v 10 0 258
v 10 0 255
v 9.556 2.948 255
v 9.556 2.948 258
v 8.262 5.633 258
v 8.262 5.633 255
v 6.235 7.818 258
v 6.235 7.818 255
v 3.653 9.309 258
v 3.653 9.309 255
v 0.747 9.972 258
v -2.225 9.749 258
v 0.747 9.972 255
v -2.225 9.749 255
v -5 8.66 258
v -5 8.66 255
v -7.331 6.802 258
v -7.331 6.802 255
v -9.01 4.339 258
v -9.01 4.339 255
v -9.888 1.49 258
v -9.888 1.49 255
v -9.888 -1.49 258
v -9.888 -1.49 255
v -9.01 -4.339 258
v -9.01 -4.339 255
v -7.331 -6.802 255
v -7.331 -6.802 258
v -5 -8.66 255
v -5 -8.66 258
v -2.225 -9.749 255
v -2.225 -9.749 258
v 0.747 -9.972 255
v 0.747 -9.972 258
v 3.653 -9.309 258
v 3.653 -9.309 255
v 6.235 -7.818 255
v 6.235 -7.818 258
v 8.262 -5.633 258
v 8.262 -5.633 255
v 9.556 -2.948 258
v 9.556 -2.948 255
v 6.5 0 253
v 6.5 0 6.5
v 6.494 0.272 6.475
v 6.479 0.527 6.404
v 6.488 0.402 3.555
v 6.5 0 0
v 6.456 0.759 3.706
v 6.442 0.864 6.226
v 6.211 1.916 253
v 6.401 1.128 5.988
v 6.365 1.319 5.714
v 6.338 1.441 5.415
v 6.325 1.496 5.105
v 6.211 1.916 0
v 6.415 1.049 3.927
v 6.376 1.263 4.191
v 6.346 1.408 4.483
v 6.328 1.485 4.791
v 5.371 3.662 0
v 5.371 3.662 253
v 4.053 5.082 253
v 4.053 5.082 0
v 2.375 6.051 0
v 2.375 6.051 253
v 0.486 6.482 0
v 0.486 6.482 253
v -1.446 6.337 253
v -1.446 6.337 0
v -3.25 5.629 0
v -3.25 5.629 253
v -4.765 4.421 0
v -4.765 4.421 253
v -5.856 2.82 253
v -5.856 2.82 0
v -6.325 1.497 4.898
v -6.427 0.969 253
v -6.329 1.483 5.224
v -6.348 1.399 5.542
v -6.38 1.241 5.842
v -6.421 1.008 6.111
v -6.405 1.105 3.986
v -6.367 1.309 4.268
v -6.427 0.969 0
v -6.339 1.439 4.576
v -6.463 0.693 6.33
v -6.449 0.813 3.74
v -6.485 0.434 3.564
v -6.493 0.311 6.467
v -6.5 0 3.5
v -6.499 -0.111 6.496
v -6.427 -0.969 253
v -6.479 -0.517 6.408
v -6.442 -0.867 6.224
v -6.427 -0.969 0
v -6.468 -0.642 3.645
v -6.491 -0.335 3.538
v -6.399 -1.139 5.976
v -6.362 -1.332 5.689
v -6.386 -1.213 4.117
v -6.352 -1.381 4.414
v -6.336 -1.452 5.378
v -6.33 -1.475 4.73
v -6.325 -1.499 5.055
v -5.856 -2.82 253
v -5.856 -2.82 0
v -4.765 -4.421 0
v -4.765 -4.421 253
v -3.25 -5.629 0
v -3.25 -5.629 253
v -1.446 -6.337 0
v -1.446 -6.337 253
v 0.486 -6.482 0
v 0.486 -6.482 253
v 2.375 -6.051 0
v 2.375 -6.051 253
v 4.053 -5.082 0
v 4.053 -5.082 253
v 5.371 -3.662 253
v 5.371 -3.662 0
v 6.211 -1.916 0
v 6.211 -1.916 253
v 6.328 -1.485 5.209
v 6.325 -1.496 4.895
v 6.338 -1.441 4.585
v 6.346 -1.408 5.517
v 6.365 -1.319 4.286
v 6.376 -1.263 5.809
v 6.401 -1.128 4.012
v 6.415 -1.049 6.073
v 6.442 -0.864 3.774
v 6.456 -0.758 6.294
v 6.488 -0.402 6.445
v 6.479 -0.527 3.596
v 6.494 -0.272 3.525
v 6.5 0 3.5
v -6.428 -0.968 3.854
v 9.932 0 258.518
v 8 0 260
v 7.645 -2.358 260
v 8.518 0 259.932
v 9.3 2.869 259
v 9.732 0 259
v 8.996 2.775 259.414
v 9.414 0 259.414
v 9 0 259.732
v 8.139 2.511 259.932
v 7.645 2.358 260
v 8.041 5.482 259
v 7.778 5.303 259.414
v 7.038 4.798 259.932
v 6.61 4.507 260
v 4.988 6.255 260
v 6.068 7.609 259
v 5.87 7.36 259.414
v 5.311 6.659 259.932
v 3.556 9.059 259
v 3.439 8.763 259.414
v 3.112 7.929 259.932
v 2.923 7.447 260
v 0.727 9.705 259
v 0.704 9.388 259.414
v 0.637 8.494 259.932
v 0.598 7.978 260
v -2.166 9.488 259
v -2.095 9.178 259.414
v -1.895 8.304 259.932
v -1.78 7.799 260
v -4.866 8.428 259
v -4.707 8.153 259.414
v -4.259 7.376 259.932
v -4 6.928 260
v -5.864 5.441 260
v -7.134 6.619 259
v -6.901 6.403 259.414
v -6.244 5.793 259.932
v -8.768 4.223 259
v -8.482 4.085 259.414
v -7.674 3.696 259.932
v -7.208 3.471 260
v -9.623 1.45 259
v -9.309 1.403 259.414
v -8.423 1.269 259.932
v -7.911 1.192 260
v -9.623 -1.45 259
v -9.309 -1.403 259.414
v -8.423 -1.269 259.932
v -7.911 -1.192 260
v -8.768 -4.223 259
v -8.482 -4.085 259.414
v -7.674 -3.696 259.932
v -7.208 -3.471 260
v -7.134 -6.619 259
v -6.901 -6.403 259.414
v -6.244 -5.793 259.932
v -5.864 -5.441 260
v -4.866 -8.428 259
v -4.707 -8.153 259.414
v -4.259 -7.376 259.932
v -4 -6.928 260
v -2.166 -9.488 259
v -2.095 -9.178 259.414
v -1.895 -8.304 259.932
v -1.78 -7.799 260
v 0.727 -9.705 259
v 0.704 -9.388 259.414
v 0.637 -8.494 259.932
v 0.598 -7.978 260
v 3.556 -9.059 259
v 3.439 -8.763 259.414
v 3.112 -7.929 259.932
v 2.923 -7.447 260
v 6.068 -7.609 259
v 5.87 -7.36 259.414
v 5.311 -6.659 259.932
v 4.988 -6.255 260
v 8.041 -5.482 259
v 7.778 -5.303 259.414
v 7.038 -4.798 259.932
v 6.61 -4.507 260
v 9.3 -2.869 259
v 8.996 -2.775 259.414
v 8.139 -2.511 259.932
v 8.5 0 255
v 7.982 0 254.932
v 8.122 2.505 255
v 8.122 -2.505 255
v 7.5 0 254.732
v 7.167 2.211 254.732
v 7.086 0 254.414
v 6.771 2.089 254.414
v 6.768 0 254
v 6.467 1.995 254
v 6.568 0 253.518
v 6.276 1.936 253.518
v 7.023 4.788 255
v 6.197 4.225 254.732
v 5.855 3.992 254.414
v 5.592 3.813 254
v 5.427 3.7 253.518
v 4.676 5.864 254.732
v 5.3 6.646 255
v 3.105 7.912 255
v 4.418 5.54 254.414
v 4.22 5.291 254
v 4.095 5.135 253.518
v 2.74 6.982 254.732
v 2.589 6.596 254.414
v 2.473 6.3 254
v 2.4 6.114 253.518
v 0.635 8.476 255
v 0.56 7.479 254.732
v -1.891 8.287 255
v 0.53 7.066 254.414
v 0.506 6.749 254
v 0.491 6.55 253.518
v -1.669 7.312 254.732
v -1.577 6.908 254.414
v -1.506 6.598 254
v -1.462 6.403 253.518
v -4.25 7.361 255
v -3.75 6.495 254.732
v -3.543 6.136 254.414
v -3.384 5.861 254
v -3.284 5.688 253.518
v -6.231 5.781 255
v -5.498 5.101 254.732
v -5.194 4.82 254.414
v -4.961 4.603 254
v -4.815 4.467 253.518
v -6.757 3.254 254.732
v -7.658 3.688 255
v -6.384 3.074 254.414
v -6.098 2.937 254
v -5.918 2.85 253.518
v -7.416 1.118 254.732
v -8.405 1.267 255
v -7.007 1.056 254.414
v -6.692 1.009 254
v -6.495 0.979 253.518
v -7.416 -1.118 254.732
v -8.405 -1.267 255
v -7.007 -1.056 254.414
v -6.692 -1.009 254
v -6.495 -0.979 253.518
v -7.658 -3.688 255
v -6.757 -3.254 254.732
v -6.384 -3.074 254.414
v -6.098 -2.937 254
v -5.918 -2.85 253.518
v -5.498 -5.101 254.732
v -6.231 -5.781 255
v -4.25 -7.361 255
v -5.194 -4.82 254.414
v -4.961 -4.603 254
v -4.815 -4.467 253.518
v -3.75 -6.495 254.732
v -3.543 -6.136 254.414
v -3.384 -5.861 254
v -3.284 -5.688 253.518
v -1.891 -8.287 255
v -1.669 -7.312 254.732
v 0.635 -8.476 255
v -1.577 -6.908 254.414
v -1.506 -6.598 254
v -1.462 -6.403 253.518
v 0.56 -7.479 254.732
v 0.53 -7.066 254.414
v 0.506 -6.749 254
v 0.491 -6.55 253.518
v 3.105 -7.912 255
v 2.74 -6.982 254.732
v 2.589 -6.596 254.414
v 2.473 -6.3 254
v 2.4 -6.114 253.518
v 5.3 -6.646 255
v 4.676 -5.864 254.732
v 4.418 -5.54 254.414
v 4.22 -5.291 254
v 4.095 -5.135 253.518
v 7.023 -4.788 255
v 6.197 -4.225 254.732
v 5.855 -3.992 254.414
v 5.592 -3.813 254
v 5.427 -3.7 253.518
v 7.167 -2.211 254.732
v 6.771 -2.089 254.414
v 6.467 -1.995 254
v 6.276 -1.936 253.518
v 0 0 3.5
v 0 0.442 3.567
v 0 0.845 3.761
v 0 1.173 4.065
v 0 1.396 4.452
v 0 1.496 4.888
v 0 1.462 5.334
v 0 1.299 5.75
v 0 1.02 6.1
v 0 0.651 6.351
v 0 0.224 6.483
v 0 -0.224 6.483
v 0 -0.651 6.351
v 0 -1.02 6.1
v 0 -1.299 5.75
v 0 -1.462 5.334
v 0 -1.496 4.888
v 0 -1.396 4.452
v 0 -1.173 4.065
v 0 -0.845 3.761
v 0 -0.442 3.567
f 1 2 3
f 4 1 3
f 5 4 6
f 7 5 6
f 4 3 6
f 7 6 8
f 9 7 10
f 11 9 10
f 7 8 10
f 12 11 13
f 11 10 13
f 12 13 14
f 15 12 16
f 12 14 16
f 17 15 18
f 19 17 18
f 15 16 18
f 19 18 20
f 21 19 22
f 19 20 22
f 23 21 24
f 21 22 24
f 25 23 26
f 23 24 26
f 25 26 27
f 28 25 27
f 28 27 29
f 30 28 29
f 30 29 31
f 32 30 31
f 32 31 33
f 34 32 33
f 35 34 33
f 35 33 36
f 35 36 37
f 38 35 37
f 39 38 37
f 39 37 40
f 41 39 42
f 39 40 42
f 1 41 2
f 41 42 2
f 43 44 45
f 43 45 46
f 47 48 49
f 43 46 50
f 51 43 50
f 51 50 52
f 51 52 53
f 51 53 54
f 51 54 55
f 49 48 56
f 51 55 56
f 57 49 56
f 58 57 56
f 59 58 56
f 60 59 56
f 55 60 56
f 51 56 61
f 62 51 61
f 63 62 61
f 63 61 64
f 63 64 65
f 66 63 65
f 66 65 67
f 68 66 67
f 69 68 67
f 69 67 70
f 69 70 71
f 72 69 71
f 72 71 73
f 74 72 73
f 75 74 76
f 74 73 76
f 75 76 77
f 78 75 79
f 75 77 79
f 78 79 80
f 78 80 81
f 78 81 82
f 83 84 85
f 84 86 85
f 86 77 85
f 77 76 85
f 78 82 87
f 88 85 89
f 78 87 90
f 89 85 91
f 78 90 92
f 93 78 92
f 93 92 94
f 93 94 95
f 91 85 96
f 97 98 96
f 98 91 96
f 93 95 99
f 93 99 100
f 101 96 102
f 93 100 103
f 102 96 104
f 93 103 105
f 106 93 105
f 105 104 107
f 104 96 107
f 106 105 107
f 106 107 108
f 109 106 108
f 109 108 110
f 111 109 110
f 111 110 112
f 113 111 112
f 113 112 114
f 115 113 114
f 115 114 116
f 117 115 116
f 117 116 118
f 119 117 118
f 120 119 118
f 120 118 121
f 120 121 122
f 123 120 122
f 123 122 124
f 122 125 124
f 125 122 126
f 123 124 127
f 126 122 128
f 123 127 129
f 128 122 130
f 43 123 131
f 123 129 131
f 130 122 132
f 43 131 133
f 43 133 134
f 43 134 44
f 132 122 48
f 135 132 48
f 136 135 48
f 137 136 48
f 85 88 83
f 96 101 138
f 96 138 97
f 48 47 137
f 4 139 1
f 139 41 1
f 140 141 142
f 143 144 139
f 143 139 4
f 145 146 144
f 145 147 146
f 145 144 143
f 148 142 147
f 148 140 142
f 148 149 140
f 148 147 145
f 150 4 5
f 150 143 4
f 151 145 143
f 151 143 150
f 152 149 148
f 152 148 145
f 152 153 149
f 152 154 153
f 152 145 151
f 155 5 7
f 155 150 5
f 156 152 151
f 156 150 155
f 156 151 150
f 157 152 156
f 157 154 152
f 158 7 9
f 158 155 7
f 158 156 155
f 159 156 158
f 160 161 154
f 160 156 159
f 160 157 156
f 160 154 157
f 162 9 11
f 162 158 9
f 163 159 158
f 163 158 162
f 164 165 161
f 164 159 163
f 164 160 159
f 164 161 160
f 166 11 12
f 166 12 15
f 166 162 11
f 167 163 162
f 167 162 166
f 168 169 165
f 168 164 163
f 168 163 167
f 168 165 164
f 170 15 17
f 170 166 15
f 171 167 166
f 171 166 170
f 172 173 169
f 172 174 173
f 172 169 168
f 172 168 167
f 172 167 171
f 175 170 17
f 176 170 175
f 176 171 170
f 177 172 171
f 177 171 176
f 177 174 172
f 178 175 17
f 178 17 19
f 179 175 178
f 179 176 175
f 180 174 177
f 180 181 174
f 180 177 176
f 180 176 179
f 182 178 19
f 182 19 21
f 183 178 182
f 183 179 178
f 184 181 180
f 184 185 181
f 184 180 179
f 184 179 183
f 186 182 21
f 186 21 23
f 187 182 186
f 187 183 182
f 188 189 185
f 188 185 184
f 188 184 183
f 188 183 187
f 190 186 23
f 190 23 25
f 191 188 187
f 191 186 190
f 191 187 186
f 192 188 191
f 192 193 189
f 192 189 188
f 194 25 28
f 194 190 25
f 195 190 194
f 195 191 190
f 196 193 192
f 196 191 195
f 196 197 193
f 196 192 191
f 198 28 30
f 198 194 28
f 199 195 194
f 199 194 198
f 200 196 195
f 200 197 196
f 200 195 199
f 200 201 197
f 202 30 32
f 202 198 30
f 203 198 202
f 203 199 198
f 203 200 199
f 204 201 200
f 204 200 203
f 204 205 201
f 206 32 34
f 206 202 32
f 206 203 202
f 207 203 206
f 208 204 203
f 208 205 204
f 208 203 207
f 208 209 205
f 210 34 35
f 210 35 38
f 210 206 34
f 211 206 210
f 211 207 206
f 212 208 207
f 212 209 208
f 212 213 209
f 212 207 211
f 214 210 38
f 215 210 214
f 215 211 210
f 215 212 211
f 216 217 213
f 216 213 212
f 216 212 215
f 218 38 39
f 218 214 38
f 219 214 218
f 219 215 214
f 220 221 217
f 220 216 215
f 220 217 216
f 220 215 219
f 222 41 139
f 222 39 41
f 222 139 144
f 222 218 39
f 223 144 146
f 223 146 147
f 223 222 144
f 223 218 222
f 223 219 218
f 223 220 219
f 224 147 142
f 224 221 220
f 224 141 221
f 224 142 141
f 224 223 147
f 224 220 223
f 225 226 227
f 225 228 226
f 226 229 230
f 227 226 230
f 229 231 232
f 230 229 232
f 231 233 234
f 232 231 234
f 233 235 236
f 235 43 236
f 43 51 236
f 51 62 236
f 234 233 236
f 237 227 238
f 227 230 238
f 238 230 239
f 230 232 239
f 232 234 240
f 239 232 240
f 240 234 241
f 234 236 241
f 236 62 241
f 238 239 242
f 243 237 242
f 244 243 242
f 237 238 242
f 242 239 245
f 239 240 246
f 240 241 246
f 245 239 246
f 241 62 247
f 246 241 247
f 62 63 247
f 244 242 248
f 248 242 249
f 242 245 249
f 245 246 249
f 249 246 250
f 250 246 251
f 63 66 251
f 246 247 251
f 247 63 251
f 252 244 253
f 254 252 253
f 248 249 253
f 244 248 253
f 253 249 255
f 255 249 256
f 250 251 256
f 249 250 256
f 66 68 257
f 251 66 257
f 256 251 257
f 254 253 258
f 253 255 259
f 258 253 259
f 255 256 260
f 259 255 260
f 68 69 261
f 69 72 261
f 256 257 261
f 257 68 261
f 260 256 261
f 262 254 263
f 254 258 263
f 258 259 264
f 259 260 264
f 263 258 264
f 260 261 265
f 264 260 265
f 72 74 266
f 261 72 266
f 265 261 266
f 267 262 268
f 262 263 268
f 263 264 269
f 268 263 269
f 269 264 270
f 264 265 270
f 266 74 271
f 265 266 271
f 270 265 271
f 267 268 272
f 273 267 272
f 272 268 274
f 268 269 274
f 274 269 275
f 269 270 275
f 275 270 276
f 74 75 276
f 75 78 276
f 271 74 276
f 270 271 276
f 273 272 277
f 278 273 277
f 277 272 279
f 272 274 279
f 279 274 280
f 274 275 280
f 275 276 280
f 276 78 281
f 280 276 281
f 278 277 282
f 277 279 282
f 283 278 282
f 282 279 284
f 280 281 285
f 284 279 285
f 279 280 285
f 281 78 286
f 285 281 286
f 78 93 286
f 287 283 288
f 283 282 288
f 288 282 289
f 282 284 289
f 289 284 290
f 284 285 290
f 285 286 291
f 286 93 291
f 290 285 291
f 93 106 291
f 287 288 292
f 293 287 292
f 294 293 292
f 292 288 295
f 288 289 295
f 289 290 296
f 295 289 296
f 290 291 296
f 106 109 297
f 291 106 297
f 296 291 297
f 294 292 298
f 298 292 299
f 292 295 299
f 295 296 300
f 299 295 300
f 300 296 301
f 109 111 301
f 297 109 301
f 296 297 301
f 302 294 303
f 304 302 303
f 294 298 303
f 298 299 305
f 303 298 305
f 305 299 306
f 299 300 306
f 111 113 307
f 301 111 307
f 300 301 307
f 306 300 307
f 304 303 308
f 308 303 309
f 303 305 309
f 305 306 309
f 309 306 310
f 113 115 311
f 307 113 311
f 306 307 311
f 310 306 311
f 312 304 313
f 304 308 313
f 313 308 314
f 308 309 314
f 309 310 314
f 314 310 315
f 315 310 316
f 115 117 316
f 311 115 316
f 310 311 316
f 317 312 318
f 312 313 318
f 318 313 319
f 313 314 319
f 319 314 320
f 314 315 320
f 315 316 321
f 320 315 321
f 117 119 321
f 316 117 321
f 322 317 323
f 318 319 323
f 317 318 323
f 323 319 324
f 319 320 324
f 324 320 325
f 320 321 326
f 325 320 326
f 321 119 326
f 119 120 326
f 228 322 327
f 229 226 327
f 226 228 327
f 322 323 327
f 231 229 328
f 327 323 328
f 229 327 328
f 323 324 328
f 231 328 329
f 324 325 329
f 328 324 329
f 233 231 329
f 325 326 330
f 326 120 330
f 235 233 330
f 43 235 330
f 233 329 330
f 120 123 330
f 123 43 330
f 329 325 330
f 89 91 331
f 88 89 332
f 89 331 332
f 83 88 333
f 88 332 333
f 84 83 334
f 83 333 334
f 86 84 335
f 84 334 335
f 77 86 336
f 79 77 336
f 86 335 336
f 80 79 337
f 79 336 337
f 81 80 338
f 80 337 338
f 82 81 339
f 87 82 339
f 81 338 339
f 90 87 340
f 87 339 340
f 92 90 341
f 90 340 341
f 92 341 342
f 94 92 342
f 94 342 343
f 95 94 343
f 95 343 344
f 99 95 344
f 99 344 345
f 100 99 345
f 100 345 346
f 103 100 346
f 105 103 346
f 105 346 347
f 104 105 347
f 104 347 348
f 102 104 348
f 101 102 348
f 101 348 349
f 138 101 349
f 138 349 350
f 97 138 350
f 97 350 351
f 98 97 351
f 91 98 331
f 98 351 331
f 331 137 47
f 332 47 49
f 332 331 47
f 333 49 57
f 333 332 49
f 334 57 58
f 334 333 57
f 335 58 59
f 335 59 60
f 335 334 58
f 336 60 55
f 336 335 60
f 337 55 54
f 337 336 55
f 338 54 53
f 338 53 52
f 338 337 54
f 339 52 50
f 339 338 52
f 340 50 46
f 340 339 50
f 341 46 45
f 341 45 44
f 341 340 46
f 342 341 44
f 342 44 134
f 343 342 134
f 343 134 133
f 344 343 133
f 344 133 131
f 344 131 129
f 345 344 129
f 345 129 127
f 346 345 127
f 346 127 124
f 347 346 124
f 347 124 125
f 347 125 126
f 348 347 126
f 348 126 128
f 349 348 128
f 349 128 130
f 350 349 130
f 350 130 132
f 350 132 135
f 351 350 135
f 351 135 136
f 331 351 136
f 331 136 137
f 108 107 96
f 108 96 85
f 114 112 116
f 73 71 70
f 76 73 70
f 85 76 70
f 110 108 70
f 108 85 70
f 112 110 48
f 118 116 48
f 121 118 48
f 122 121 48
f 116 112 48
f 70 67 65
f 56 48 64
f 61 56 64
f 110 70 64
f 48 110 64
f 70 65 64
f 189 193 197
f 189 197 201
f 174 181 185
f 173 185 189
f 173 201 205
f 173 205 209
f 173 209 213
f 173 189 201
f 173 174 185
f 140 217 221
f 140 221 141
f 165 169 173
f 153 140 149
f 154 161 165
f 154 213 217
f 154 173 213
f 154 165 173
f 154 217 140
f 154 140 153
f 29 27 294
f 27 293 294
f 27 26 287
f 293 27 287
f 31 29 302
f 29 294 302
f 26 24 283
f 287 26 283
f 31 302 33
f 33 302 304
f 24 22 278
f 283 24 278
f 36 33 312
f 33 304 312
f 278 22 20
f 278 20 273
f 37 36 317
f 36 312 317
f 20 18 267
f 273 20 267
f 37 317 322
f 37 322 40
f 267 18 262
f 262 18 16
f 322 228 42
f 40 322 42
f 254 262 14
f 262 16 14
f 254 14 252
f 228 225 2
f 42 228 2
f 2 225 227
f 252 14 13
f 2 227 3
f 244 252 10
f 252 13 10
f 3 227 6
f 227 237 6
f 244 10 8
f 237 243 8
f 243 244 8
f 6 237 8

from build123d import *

# Parameters (mm, degrees)
SKETCH1_R               = 6.5
BOSS_EXTRUDE1_DEPTH     = 255
SKETCH2_R               = 10
BOSS_EXTRUDE2_DEPTH     = 5
FILLET1_R               = 2
SKETCH3_R               = 1.5
CUT_EXTRUDE1_DEPTH      = 11.0000001
CUT_EXTRUDE1_DEPTH_BACK = 11


with BuildPart() as part:
    # Sketch1 → Boss-Extrude1 (new body)
    with BuildSketch(Plane.XY):
        Circle(SKETCH1_R)
    extrude(amount=BOSS_EXTRUDE1_DEPTH)

    # Sketch2 → Boss-Extrude2 (add)
    with BuildSketch(Plane.XY.offset(255)):
        Circle(SKETCH2_R)
    extrude(amount=BOSS_EXTRUDE2_DEPTH)

    # Fillet1
    fillet1_edges = [part.edges().sort_by_distance(p)[0] for p in [
        (-6.5, 0, 255),
        (-10, 0, 260),
    ]]
    fillet(fillet1_edges, radius=FILLET1_R)

    # Sketch3 → Cut-Extrude1 (cut, two sides)
    with BuildSketch(Plane(origin=(0, 0, 0), x_dir=(0, 0, -1), z_dir=(1, 0, 0))) as cut_extrude1_sk:
        with Locations((-5, 0)):
            Circle(SKETCH3_R)
    extrude(amount=CUT_EXTRUDE1_DEPTH, mode=Mode.SUBTRACT)
    extrude(cut_extrude1_sk.sketch, amount=-CUT_EXTRUDE1_DEPTH_BACK, mode=Mode.SUBTRACT)


solid = part.part
